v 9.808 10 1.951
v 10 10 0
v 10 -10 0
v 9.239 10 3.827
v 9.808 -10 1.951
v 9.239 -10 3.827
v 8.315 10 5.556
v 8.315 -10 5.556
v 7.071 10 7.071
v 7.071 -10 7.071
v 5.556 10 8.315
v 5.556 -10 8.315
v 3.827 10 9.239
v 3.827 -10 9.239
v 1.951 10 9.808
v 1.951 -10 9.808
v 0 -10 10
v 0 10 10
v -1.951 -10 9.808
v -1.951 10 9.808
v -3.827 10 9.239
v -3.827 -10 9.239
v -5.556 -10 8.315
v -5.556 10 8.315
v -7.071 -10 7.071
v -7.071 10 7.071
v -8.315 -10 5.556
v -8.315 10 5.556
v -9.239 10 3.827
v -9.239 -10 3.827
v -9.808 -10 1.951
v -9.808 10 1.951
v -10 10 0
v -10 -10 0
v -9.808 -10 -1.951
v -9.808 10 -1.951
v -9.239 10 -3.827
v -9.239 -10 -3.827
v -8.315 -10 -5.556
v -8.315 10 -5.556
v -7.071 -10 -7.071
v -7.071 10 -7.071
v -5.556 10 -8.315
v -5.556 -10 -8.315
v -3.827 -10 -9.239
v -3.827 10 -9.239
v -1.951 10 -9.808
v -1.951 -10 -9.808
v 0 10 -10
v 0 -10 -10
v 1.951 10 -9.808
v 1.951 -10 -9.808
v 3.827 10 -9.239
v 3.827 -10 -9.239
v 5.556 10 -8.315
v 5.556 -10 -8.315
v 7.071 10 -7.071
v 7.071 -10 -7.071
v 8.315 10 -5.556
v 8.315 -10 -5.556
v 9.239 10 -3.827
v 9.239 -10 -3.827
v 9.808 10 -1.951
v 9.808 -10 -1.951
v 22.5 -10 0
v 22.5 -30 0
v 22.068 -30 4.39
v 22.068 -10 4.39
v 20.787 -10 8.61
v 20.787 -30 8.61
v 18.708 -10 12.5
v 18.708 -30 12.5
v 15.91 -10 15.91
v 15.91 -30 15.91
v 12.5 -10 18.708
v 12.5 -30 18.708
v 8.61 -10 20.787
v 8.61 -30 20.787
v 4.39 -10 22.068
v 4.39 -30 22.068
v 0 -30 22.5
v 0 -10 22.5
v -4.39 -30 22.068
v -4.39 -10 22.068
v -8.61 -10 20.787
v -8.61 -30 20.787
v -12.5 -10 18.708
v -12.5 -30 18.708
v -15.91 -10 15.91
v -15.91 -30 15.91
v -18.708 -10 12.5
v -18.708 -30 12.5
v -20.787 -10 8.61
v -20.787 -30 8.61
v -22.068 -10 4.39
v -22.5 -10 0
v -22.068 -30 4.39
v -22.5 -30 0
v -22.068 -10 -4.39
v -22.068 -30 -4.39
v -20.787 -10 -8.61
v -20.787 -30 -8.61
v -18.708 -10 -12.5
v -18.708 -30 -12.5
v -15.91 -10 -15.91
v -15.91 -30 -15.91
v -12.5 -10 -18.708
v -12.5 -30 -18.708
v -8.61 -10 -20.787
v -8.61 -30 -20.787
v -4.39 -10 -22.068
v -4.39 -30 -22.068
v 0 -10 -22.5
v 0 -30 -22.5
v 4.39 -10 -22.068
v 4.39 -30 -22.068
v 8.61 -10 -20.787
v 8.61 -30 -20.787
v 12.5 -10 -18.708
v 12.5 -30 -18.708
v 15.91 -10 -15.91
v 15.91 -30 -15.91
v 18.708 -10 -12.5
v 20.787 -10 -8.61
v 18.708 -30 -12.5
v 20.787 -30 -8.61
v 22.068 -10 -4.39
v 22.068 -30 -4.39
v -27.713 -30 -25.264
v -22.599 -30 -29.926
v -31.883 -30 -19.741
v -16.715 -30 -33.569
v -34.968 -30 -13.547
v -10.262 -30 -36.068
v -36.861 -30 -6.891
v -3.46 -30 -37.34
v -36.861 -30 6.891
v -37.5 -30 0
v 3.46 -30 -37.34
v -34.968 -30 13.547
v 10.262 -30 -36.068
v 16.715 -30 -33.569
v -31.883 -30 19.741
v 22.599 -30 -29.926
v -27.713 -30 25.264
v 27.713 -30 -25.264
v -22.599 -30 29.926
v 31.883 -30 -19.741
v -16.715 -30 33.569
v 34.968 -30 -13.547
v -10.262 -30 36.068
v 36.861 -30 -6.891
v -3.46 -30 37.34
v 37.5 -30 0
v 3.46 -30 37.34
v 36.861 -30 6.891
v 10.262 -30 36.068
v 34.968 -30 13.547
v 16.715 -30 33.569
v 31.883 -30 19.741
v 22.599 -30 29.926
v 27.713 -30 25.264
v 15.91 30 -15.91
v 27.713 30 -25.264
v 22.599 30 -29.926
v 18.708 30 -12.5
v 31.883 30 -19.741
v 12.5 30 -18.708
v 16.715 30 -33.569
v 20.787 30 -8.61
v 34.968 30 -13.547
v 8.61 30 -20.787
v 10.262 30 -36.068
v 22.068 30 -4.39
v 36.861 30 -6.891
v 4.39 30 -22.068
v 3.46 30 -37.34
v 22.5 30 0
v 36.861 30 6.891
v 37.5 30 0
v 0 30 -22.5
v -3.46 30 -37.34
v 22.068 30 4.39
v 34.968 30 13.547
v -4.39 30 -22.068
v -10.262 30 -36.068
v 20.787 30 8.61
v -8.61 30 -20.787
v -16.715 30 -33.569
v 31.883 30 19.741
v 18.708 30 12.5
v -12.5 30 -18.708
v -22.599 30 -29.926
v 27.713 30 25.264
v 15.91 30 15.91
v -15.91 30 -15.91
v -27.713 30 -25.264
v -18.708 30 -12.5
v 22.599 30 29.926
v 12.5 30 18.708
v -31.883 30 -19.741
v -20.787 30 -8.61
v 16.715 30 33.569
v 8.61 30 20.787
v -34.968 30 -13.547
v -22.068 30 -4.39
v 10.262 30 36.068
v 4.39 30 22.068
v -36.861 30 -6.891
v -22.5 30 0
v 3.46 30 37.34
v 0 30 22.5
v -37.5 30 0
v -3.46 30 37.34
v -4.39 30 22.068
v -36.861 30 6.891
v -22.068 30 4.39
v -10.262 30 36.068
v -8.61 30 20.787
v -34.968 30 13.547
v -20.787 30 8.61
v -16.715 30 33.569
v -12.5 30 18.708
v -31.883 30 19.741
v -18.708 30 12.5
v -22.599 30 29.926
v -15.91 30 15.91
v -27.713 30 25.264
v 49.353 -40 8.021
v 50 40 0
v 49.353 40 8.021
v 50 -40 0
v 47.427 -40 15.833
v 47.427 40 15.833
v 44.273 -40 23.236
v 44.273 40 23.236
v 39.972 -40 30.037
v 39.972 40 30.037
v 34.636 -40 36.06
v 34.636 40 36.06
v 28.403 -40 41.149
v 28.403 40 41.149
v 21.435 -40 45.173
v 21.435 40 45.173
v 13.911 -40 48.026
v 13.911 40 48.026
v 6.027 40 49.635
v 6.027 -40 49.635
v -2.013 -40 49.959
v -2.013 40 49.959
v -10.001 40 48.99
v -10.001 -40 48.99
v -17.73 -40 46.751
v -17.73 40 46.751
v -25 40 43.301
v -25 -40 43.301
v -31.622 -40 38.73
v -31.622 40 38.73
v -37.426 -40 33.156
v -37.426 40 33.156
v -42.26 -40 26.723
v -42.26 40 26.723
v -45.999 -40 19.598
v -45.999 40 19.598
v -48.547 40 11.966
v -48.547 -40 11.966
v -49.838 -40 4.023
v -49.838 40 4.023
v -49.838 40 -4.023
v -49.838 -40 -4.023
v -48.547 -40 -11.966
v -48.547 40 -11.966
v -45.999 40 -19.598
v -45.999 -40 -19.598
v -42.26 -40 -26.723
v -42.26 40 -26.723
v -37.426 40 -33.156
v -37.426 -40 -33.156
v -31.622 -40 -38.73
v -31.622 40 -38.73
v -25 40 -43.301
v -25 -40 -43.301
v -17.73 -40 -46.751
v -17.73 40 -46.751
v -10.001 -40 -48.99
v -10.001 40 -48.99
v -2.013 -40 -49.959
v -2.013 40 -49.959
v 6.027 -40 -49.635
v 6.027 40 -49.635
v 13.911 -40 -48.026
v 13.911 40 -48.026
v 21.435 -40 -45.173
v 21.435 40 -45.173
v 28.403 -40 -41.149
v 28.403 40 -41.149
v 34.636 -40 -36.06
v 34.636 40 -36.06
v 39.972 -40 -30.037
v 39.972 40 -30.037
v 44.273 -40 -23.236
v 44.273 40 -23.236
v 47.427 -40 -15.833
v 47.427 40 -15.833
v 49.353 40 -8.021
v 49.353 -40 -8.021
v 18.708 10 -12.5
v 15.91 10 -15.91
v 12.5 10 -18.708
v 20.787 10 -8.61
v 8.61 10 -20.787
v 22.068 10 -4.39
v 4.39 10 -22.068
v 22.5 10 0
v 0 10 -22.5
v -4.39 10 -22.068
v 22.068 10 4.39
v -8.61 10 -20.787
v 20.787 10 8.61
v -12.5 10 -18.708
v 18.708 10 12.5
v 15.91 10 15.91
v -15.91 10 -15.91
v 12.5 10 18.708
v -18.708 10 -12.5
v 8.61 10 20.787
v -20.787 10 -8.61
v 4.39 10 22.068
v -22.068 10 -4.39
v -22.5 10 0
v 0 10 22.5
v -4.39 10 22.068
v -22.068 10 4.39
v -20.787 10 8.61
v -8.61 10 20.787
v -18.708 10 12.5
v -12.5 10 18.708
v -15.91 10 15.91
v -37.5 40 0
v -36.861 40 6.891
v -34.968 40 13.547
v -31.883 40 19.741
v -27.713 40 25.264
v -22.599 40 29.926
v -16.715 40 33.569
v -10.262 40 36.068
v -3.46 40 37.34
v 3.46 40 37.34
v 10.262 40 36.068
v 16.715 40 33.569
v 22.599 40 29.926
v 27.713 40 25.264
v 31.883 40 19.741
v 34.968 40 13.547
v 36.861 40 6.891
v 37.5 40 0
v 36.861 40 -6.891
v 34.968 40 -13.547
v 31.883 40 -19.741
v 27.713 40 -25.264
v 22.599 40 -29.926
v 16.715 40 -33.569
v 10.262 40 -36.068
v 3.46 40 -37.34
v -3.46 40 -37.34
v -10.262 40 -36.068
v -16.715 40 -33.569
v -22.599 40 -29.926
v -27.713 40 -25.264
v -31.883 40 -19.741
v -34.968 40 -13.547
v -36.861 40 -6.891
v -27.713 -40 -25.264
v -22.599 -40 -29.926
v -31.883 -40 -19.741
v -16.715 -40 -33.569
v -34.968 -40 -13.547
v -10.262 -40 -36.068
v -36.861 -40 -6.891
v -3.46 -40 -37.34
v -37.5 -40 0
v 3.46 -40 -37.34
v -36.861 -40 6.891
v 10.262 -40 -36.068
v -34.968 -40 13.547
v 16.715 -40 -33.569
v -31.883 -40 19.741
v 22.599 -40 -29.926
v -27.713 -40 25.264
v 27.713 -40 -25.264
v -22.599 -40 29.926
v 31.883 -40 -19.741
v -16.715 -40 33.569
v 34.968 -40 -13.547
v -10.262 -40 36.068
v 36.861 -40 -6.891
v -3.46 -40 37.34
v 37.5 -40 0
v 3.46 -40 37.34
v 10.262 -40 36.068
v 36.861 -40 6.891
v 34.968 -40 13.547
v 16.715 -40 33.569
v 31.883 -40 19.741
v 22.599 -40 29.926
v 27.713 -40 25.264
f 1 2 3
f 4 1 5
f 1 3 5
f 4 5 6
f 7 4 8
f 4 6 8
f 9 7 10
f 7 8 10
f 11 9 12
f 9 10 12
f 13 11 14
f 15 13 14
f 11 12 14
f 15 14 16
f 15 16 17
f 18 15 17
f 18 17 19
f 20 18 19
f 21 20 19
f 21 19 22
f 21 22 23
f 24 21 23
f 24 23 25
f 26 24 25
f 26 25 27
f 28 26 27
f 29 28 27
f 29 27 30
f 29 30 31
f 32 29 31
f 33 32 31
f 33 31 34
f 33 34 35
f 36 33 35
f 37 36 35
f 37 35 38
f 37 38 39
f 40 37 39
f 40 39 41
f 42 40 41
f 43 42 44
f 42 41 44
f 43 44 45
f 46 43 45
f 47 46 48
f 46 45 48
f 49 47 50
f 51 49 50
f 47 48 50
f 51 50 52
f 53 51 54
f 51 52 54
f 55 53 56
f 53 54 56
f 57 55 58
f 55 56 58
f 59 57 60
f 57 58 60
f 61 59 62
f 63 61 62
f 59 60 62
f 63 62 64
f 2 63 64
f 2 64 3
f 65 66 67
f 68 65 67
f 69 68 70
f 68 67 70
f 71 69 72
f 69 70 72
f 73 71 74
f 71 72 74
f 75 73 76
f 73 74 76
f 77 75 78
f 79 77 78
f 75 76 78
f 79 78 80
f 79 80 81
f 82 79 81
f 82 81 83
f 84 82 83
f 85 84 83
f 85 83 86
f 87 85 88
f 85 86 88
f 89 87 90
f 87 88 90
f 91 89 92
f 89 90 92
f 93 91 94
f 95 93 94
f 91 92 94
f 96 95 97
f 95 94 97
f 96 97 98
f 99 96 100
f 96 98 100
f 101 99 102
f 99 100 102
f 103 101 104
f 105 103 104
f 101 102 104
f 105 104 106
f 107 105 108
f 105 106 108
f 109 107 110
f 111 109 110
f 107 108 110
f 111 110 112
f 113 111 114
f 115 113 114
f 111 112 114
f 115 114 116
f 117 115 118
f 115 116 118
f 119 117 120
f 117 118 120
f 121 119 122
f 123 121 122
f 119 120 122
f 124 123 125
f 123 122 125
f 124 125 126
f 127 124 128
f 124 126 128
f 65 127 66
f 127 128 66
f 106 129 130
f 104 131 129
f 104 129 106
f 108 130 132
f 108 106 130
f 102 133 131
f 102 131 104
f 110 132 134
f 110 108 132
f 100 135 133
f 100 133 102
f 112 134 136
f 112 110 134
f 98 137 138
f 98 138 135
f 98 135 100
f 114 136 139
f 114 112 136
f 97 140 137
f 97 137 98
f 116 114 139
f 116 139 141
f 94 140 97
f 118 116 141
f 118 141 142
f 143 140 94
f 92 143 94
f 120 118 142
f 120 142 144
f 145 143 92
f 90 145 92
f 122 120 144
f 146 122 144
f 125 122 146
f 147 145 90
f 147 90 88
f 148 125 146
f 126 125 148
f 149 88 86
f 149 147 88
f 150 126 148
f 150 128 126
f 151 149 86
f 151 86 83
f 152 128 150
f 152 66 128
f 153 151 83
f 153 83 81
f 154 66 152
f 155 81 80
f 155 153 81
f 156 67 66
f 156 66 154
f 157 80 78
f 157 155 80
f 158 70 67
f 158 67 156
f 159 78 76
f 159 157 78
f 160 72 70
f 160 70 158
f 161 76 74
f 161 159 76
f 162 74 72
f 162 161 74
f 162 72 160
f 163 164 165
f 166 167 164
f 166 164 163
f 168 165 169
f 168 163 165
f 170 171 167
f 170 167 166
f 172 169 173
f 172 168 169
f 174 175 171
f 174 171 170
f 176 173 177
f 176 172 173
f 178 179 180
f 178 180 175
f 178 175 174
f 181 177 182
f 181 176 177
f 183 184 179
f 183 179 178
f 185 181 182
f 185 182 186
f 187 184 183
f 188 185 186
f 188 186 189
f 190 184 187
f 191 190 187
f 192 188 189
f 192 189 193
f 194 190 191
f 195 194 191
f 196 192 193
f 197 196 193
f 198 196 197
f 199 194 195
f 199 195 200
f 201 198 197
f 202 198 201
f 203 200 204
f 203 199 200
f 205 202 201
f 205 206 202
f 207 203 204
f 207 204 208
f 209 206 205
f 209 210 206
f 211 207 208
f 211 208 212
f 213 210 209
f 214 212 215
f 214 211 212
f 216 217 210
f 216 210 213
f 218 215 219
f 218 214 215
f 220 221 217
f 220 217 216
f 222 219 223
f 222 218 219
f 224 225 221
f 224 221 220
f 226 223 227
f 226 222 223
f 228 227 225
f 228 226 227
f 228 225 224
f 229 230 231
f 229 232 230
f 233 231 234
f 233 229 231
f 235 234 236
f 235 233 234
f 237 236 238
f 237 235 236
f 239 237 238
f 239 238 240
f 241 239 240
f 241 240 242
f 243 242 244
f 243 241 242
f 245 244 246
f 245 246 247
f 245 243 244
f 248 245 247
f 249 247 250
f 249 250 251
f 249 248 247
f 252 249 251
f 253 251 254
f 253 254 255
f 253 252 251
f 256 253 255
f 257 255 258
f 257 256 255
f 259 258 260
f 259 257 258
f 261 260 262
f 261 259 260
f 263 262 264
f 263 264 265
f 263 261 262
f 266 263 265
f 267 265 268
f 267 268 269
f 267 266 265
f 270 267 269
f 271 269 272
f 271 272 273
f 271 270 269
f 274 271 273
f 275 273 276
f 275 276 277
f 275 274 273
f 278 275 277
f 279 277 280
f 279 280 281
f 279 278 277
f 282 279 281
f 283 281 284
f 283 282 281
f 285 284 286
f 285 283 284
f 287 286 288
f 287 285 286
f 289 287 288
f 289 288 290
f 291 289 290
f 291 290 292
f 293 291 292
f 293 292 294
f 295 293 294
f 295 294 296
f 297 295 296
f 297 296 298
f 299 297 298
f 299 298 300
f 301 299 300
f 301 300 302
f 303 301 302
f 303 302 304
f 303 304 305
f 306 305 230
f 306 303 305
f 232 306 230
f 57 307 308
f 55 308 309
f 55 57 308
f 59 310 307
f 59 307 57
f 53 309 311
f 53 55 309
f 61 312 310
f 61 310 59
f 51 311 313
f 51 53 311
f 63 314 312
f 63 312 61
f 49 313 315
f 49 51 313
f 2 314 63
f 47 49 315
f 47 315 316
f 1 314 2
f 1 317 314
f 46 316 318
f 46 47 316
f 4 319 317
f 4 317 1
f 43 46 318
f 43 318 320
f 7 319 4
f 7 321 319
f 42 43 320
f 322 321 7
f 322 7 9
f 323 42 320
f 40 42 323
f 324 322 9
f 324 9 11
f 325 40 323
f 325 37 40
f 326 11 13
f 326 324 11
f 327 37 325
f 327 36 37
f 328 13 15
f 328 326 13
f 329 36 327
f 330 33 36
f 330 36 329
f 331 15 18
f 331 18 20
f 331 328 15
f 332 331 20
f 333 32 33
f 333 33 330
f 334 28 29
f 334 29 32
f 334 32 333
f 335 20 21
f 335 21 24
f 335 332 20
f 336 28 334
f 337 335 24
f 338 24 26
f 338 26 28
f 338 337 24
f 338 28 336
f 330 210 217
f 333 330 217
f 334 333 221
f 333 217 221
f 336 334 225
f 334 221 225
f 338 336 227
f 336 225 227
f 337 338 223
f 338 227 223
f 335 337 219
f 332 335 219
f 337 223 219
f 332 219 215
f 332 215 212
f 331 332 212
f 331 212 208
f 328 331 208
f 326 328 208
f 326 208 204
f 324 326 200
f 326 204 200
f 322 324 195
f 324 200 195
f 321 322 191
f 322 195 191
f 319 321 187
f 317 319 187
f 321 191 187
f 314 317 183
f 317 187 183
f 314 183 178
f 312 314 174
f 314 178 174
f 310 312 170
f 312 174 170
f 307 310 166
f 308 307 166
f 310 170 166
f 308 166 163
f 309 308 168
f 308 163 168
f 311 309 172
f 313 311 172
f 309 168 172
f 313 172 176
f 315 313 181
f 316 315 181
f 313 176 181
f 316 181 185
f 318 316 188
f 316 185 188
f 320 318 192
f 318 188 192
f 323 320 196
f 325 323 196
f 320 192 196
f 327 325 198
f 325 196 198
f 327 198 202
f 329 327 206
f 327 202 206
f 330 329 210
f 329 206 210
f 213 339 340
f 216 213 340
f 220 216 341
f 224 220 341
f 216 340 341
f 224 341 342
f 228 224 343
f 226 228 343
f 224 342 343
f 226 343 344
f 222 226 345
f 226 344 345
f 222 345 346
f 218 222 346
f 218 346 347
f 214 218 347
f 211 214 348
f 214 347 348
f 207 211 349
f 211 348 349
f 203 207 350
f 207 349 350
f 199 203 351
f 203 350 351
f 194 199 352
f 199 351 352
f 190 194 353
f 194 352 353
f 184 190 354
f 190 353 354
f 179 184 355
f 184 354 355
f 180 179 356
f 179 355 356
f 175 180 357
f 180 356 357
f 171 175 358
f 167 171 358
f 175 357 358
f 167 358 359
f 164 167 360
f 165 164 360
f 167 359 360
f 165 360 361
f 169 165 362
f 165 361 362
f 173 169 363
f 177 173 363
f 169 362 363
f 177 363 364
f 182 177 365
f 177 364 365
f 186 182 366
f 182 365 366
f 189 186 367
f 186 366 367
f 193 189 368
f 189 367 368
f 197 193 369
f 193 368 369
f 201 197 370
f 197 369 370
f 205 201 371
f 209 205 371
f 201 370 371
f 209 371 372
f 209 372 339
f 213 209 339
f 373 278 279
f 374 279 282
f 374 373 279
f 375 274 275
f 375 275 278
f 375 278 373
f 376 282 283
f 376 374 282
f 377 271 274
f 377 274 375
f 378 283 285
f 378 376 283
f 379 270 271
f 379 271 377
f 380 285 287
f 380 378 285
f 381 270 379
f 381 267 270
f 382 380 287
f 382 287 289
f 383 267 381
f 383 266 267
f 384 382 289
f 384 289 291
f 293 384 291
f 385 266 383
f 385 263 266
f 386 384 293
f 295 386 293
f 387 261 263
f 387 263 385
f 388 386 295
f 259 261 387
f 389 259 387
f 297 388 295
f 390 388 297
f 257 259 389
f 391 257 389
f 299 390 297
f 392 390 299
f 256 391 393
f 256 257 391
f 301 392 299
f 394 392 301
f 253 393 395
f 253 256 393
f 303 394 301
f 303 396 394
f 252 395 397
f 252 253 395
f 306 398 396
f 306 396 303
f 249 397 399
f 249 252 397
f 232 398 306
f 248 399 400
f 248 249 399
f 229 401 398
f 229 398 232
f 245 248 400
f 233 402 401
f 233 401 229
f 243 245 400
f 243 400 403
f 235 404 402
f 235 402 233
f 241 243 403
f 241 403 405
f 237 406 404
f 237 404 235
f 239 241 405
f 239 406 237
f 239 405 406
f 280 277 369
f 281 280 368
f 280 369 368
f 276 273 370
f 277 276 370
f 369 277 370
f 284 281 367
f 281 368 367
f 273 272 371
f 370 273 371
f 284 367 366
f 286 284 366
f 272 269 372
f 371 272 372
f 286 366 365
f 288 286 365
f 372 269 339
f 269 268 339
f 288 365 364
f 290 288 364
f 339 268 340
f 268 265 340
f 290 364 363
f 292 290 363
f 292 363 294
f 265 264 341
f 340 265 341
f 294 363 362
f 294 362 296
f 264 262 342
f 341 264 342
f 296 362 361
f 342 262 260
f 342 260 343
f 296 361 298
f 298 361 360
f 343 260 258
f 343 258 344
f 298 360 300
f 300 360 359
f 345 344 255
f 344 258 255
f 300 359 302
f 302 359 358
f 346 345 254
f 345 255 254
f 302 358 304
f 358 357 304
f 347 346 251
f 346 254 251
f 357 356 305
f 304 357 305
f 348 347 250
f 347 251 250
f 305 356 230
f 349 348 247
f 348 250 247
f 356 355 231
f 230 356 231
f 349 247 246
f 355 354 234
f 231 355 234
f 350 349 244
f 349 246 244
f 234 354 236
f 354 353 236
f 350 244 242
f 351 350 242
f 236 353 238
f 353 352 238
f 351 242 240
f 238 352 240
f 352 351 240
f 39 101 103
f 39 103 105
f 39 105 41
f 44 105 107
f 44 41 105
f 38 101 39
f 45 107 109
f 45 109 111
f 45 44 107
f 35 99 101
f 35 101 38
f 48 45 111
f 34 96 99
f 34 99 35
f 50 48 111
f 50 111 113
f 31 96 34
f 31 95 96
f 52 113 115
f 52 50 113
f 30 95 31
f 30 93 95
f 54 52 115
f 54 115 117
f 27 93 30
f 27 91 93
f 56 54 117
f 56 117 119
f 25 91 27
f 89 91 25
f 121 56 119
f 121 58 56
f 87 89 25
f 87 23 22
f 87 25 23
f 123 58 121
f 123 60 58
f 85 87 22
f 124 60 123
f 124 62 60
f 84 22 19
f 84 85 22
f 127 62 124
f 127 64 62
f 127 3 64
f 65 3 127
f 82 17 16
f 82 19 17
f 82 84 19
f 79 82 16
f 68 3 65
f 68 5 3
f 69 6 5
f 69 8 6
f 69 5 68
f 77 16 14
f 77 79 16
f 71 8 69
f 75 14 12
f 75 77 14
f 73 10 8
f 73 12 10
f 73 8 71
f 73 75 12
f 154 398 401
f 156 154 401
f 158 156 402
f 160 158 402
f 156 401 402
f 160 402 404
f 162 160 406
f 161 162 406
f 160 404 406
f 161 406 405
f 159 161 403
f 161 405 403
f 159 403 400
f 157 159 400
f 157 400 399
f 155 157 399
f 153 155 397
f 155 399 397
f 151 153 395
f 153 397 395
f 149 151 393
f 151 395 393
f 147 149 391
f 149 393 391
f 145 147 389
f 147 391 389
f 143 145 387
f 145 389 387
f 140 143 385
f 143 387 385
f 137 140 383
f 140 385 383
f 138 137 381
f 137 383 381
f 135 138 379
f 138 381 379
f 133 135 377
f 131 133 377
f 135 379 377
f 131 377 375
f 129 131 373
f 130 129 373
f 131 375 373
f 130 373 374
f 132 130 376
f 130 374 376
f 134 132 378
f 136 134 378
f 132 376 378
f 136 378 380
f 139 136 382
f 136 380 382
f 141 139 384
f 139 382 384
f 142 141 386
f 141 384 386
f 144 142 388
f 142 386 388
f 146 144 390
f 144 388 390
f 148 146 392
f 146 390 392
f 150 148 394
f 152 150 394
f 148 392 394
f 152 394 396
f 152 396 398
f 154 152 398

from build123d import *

# Parameters (mm, degrees)
F0_R      = 50
F1_DEPTH  = 40
F2_R      = 10
F3_DEPTH  = 80.001
F4_R      = 37.5
F5_DEPTH  = 10
F6_R      = 22.5
F7_DEPTH  = 20
F8_R      = 37.5
F9_DEPTH  = 10
F10_R     = 22.5
F11_DEPTH = 20


with BuildPart() as f1:
    # F0 (on Front) → F1 (new body, symmetric)
    with BuildSketch(Plane.XZ):
        Circle(F0_R)
    extrude(amount=F1_DEPTH, both=True)

    # F2 (on face) → F3 (cut, through all)
    with BuildSketch(Plane.XZ.offset(40)):
        Circle(F2_R)
    extrude(amount=-F3_DEPTH, mode=Mode.SUBTRACT)

    # F4 (on face) → F5 (cut)
    with BuildSketch(Plane(origin=(0, 40, 0), x_dir=(-1, 0, 0), z_dir=(0, 1, 0))):
        Circle(F4_R)
    extrude(amount=-F5_DEPTH, mode=Mode.SUBTRACT)

    # F6 (on face) → F7 (cut)
    with BuildSketch(Plane(origin=(0, 30, 0), x_dir=(-1, 0, 0), z_dir=(0, 1, 0))):
        Circle(F6_R)
    extrude(amount=-F7_DEPTH, mode=Mode.SUBTRACT)

    # F8 (on face) → F9 (cut)
    with BuildSketch(Plane.XZ.offset(40)):
        Circle(F8_R)
    extrude(amount=-F9_DEPTH, mode=Mode.SUBTRACT)

    # F10 (on face) → F11 (cut)
    with BuildSketch(Plane.XZ.offset(30)):
        Circle(F10_R)
    extrude(amount=-F11_DEPTH, mode=Mode.SUBTRACT)


solid = f1.part
